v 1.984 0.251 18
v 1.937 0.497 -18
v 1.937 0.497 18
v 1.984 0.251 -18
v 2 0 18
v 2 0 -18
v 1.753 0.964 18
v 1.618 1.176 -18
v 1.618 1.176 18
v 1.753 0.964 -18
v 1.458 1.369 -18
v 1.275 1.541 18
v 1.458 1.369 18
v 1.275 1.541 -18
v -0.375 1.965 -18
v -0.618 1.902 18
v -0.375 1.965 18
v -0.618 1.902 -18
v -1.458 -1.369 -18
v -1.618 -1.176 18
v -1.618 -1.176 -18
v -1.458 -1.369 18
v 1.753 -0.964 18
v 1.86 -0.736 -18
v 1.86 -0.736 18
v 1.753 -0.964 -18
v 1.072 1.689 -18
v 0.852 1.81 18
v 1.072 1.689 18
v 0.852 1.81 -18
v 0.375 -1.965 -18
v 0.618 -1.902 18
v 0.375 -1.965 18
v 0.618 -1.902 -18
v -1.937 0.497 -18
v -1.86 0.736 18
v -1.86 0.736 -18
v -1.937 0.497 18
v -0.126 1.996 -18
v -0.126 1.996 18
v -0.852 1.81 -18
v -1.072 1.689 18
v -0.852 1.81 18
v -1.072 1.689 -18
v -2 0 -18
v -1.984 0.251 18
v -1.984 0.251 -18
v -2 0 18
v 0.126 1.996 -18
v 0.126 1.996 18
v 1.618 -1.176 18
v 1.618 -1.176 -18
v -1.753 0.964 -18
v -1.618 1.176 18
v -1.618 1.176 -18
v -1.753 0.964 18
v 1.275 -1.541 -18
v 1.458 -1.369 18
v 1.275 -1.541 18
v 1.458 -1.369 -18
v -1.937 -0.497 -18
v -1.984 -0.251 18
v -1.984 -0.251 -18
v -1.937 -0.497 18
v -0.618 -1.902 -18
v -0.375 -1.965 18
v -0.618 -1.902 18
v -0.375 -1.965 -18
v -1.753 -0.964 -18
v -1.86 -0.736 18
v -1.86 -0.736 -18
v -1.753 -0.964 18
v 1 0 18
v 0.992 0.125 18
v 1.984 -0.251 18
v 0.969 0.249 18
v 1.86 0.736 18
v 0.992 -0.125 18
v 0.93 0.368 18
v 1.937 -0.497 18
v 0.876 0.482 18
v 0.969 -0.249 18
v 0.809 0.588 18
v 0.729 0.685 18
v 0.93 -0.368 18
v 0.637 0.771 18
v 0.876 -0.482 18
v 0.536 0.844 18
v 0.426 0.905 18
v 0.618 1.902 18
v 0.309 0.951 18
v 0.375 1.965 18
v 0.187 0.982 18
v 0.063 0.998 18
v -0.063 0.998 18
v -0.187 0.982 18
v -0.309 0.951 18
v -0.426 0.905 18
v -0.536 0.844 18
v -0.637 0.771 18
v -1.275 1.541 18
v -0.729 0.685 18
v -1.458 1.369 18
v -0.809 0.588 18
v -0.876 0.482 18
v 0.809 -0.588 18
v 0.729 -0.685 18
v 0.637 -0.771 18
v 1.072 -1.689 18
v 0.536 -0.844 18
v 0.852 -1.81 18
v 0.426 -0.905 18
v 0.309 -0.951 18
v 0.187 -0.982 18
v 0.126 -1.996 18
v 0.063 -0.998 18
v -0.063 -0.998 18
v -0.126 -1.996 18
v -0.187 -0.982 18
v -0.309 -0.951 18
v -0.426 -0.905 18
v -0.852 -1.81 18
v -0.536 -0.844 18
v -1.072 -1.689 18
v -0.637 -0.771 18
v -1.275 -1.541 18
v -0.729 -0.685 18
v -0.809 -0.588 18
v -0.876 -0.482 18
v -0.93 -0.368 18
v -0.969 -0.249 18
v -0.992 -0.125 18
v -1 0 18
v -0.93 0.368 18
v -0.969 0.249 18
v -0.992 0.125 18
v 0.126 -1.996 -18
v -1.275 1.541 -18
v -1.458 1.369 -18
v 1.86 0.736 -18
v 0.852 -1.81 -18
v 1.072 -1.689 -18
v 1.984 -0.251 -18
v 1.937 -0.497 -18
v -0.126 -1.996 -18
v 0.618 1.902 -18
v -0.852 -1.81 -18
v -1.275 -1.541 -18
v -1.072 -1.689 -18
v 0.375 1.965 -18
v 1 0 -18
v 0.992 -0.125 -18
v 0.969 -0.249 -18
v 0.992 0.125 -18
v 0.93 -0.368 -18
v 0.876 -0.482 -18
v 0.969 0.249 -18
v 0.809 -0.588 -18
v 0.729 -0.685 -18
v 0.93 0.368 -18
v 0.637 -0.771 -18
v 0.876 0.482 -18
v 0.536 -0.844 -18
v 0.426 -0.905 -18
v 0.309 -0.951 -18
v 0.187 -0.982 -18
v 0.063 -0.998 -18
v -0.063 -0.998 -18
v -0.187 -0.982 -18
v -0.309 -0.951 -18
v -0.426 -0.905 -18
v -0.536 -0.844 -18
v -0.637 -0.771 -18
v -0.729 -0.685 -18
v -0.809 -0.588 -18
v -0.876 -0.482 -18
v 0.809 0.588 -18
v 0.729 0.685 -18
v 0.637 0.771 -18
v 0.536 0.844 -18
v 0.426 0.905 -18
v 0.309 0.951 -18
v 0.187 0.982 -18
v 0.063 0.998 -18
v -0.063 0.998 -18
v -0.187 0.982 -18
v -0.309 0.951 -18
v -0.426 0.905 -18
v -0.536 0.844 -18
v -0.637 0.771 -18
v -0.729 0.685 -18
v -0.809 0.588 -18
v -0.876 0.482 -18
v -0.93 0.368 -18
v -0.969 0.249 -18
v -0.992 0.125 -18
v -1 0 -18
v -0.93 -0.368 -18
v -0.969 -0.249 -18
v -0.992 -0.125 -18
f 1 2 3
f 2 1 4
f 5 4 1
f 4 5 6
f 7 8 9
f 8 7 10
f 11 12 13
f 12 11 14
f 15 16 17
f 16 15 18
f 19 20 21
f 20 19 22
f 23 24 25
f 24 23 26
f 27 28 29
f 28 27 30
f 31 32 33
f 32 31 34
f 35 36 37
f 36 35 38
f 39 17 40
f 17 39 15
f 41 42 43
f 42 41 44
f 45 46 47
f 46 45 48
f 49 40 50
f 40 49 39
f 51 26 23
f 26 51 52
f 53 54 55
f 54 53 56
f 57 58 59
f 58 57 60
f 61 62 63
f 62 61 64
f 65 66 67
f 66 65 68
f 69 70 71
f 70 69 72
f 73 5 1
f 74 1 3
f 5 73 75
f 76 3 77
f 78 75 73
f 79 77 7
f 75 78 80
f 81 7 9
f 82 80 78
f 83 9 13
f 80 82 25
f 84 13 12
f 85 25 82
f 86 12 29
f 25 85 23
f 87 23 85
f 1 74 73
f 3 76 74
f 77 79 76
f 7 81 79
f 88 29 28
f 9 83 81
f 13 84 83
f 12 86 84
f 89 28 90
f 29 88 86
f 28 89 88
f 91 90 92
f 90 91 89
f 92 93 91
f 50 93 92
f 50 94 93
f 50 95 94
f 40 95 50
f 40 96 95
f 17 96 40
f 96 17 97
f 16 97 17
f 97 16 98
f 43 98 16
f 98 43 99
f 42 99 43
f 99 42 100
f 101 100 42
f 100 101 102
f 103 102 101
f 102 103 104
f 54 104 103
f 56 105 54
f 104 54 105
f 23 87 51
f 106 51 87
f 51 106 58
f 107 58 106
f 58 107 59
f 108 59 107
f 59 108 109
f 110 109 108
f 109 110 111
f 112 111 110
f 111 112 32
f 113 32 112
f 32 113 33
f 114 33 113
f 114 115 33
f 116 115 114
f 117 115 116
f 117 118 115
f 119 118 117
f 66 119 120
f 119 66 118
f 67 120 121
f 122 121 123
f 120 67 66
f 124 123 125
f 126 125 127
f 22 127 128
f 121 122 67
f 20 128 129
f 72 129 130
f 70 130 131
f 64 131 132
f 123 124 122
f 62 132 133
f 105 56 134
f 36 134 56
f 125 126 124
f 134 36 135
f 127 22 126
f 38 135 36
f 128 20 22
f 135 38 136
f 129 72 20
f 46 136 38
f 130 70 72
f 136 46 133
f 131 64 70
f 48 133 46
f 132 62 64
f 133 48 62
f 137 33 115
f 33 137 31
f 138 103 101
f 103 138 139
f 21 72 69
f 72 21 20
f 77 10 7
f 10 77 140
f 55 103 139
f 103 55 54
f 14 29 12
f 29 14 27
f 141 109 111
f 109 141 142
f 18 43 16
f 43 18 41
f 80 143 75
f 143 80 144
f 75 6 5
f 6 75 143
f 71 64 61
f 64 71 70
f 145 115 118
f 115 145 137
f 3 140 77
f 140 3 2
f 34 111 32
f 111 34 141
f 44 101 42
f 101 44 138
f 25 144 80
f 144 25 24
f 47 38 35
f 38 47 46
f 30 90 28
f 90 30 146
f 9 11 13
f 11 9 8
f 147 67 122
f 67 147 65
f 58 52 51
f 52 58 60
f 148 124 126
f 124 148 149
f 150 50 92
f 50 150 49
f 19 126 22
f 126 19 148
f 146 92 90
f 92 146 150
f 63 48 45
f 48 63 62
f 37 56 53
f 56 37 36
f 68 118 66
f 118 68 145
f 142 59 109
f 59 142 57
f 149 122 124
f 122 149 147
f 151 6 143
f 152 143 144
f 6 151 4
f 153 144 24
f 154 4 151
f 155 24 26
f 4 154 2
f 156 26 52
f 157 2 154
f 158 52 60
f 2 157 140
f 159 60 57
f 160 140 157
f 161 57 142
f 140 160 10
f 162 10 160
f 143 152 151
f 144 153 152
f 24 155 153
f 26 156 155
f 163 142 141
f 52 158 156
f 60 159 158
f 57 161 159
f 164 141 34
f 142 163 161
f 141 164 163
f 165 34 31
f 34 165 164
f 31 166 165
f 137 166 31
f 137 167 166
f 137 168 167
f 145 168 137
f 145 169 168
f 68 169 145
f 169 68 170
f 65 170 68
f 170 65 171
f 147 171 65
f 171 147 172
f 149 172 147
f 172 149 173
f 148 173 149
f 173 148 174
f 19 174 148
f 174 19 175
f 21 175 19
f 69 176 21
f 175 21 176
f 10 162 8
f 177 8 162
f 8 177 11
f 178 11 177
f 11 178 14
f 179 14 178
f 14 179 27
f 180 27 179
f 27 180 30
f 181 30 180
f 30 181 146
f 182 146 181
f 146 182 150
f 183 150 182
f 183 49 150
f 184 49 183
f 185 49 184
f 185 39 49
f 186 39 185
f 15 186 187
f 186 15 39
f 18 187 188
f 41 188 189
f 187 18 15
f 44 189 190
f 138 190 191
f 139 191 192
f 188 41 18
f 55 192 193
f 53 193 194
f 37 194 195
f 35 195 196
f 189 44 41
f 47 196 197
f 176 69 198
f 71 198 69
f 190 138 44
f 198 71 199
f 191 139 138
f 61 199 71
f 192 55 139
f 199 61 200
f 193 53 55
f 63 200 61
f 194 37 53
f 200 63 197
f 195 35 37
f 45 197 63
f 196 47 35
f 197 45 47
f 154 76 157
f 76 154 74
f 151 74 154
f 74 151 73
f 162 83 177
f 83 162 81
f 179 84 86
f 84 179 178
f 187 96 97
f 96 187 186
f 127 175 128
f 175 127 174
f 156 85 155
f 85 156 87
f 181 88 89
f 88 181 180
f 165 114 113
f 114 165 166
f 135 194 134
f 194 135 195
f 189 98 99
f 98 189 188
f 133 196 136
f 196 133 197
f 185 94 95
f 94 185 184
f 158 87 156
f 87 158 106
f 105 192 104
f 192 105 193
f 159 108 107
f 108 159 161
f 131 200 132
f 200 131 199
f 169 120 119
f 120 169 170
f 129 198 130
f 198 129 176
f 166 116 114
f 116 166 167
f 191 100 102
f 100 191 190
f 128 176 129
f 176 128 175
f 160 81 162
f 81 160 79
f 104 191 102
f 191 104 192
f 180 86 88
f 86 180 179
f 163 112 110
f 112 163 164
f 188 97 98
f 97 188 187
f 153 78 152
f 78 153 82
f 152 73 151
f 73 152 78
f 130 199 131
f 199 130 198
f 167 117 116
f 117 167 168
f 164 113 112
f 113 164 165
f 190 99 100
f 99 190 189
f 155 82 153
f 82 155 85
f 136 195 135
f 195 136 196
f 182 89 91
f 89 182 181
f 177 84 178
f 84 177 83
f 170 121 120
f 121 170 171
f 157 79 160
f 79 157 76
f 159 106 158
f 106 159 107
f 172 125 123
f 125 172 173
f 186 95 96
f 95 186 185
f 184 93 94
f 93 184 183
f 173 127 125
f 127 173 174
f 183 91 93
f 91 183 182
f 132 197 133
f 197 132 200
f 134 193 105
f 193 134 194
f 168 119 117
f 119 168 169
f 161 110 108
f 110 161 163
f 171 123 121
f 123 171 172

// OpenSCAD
$fn = 50;


difference() {
	union() {
		translate(v = [0, 0, -18.0000000000]) {
			cylinder(h = 36, r = 2.0000000000);
		}
	}
	union() {
		translate(v = [0, 0, -100.0000000000]) {
			cylinder(h = 200, r = 1.0000000000);
		}
	}
}
